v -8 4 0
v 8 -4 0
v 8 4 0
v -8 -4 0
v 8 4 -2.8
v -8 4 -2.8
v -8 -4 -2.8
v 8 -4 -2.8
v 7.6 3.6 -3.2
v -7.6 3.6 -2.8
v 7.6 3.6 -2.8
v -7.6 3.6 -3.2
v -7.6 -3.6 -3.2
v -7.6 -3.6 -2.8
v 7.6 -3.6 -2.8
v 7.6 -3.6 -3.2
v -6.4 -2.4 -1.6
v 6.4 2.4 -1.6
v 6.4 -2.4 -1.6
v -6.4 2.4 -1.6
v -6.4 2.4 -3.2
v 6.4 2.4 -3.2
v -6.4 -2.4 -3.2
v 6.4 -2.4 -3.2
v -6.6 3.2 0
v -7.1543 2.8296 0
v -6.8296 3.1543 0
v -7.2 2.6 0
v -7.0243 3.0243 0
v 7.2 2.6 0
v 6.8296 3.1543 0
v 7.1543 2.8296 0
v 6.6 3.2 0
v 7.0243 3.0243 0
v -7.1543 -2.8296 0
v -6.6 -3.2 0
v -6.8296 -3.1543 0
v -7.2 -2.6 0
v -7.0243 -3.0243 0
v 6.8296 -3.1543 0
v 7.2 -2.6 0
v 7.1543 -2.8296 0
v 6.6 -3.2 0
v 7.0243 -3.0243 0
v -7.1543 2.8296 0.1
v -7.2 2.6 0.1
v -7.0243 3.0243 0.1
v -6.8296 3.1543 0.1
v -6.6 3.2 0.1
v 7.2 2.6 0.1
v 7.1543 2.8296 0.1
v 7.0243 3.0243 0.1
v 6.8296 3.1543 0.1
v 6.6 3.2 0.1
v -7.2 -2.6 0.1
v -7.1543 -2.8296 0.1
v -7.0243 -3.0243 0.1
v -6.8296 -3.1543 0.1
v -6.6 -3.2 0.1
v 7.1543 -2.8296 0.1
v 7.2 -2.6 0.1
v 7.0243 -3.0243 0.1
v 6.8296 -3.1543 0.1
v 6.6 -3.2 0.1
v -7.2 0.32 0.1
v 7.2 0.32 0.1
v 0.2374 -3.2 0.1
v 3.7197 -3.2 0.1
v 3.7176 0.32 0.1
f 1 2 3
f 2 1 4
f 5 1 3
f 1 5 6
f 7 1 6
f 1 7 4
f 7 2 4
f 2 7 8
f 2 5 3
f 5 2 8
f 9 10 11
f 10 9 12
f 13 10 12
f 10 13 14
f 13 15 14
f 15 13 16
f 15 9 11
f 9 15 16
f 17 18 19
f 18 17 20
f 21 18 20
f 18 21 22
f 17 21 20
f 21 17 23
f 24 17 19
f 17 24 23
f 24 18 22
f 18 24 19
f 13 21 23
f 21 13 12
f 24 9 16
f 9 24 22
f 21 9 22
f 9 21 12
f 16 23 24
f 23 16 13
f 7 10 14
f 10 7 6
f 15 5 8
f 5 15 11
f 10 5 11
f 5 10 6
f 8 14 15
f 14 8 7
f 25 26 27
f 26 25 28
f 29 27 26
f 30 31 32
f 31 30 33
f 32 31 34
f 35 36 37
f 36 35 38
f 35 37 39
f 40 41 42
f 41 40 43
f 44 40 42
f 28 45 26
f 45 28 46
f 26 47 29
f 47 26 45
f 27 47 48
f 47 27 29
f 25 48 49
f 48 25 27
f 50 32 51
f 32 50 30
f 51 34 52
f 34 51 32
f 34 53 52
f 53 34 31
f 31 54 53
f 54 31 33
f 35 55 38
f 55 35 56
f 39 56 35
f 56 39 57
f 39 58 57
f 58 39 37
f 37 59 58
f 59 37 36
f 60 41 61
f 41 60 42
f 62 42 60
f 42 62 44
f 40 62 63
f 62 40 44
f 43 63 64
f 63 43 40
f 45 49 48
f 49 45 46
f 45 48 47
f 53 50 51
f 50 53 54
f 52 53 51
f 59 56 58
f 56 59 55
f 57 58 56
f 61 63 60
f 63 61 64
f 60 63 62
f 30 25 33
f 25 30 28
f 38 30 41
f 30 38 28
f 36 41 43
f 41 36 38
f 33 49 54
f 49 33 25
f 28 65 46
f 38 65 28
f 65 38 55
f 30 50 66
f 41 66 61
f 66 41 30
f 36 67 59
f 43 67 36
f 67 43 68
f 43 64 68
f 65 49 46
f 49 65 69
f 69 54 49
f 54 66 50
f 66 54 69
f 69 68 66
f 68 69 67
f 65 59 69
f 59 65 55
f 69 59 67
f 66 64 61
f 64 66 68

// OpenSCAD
// file: ../p/box5.scad
use <../lib.scad>
function ldraw_lib__box5() = [
// 0 Box with 5 Faces and All Edges
// 0 Name: box5.dat
// 0 Author: James Jessiman
// 0 !LDRAW_ORG Primitive UPDATE 2012-01
// 0 !LICENSE Licensed under CC BY 4.0 : see CAreadme.txt
// 
// 0 BFC CERTIFY CCW
  [0,"BFC","CERTIFY"],
  [0,"BFC","CCW"],
// 
// 0 !HISTORY 2002-04-03 [sbliss] Modified for BFC compliance
// 0 !HISTORY 2002-04-25 [PTadmin] Official Update 2002-02
// 0 !HISTORY 2007-06-24 [PTadmin] Header formatted for Contributor Agreement
// 0 !HISTORY 2008-07-01 [PTadmin] Official Update 2008-01
// 0 !HISTORY 2012-02-16 [Philo] Changed to CCW
// 0 !HISTORY 2012-03-30 [PTadmin] Official Update 2012-01
// 
// 
// 2 24 1 1 1 -1 1 1
  [2,24,1,1,1,-1,1,1],
// 2 24 -1 1 1 -1 1 -1
  [2,24,-1,1,1,-1,1,-1],
// 2 24 -1 1 -1 1 1 -1
  [2,24,-1,1,-1,1,1,-1],
// 2 24 1 1 -1 1 1 1
  [2,24,1,1,-1,1,1,1],
// 2 24 1 0 1 -1 0 1
  [2,24,1,0,1,-1,0,1],
// 2 24 -1 0 1 -1 0 -1
  [2,24,-1,0,1,-1,0,-1],
// 2 24 -1 0 -1 1 0 -1
  [2,24,-1,0,-1,1,0,-1],
// 2 24 1 0 -1 1 0 1
  [2,24,1,0,-1,1,0,1],
// 2 24 1 0 1 1 1 1
  [2,24,1,0,1,1,1,1],
// 2 24 -1 0 1 -1 1 1
  [2,24,-1,0,1,-1,1,1],
// 2 24 1 0 -1 1 1 -1
  [2,24,1,0,-1,1,1,-1],
// 2 24 -1 0 -1 -1 1 -1
  [2,24,-1,0,-1,-1,1,-1],
// 4 16 -1 1 1 1 1 1 1 1 -1 -1 1 -1
  [4,16,-1,1,1,1,1,1,1,1,-1,-1,1,-1],
// 4 16 -1 1 1 -1 0 1 1 0 1 1 1 1
  [4,16,-1,1,1,-1,0,1,1,0,1,1,1,1],
// 4 16 -1 1 -1 -1 0 -1 -1 0 1 -1 1 1
  [4,16,-1,1,-1,-1,0,-1,-1,0,1,-1,1,1],
// 4 16 1 1 -1 1 0 -1 -1 0 -1 -1 1 -1
  [4,16,1,1,-1,1,0,-1,-1,0,-1,-1,1,-1],
// 4 16 1 1 1 1 0 1 1 0 -1 1 1 -1
  [4,16,1,1,1,1,0,1,1,0,-1,1,1,-1],
];
module ldraw_lib__box5(step=0, col=false, unit=2/5, alt=false, line=0.2, solid=!$preview)
    makepoly(ldraw_lib__box5(), step=step, col=col, unit=unit, alt=alt, line=line, solid=solid);
ldraw_lib__box5(line=0.2);
// file: ../p/box4.scad
use <../lib.scad>
function ldraw_lib__box4() = [
// 0 Box with 4 Faces (2 Parallel Pairs) and All Edges
// 0 Name: box4.dat
// 0 Author: James Jessiman
// 0 !LDRAW_ORG Primitive UPDATE 2012-01
// 0 !LICENSE Licensed under CC BY 4.0 : see CAreadme.txt
// 
// 0 BFC CERTIFY CCW
  [0,"BFC","CERTIFY"],
  [0,"BFC","CCW"],
// 
// 0 !HISTORY 2002-04-03 [sbliss] Modified for BFC compliance
// 0 !HISTORY 2002-04-25 [PTadmin] Official Update 2002-02
// 0 !HISTORY 2007-06-24 [PTadmin] Header formatted for Contributor Agreement
// 0 !HISTORY 2008-07-01 [PTadmin] Official Update 2008-01
// 0 !HISTORY 2012-02-16 [Philo] Changed to CCW
// 0 !HISTORY 2012-03-30 [PTadmin] Official Update 2012-01
// 
// 
// 2 24 1 1 1 -1 1 1
  [2,24,1,1,1,-1,1,1],
// 2 24 -1 1 1 -1 1 -1
  [2,24,-1,1,1,-1,1,-1],
// 2 24 -1 1 -1 1 1 -1
  [2,24,-1,1,-1,1,1,-1],
// 2 24 1 1 -1 1 1 1
  [2,24,1,1,-1,1,1,1],
// 2 24 1 0 1 -1 0 1
  [2,24,1,0,1,-1,0,1],
// 2 24 -1 0 1 -1 0 -1
  [2,24,-1,0,1,-1,0,-1],
// 2 24 -1 0 -1 1 0 -1
  [2,24,-1,0,-1,1,0,-1],
// 2 24 1 0 -1 1 0 1
  [2,24,1,0,-1,1,0,1],
// 2 24 1 0 1 1 1 1
  [2,24,1,0,1,1,1,1],
// 2 24 -1 0 1 -1 1 1
  [2,24,-1,0,1,-1,1,1],
// 2 24 1 0 -1 1 1 -1
  [2,24,1,0,-1,1,1,-1],
// 2 24 -1 0 -1 -1 1 -1
  [2,24,-1,0,-1,-1,1,-1],
// 4 16 -1 1 1 -1 0 1 1 0 1 1 1 1
  [4,16,-1,1,1,-1,0,1,1,0,1,1,1,1],
// 4 16 -1 1 -1 -1 0 -1 -1 0 1 -1 1 1
  [4,16,-1,1,-1,-1,0,-1,-1,0,1,-1,1,1],
// 4 16 1 1 -1 1 0 -1 -1 0 -1 -1 1 -1
  [4,16,1,1,-1,1,0,-1,-1,0,-1,-1,1,-1],
// 4 16 1 1 1 1 0 1 1 0 -1 1 1 -1
  [4,16,1,1,1,1,0,1,1,0,-1,1,1,-1],
];
module ldraw_lib__box4(step=0, col=false, unit=2/5, alt=false, line=0.2, solid=!$preview)
    makepoly(ldraw_lib__box4(), step=step, col=col, unit=unit, alt=alt, line=line, solid=solid);
ldraw_lib__box4(line=0.2);
// file: ../p/1-4cyli.scad
use <../lib.scad>
function ldraw_lib__1_4cyli() = [
// 0 Cylinder 0.25
// 0 Name: 1-4cyli.dat
// 0 Author: James Jessiman
// 0 !LDRAW_ORG Primitive UPDATE 2012-01
// 0 !LICENSE Licensed under CC BY 4.0 : see CAreadme.txt
// 
// 0 BFC CERTIFY CCW
  [0,"BFC","CERTIFY"],
  [0,"BFC","CCW"],
// 
// 0 !HISTORY 2002-03-23 [sbliss] Added BFC statement.
// 0 !HISTORY 2002-04-25 [PTadmin] Official Update 2002-02
// 0 !HISTORY 2007-06-22 [PTadmin] Header formatted for Contributor Agreement
// 0 !HISTORY 2008-07-01 [PTadmin] Official Update 2008-01
// 0 !HISTORY 2012-02-16 [Philo] Changed to CCW
// 0 !HISTORY 2012-03-30 [PTadmin] Official Update 2012-01
// 
// 
// 4 16 1 1 0 0.9239 1 0.3827 0.9239 0 0.3827 1 0 0
  [4,16,1,1,0,0.9239,1,0.3827,0.9239,0,0.3827,1,0,0],
// 5 24 1 0 0 1 1 0 0.9239 0 0.3827 1 0 -1
  [5,24,1,0,0,1,1,0,0.9239,0,0.3827,1,0,-1],
// 4 16 0.9239 1 0.3827 0.7071 1 0.7071 0.7071 0 0.7071 0.9239 0 0.3827
  [4,16,0.9239,1,0.3827,0.7071,1,0.7071,0.7071,0,0.7071,0.9239,0,0.3827],
// 5 24 0.9239 0 0.3827 0.9239 1 0.3827 0.7071 0 0.7071 1 0 0
  [5,24,0.9239,0,0.3827,0.9239,1,0.3827,0.7071,0,0.7071,1,0,0],
// 4 16 0.7071 1 0.7071 0.3827 1 0.9239 0.3827 0 0.9239 0.7071 0 0.7071
  [4,16,0.7071,1,0.7071,0.3827,1,0.9239,0.3827,0,0.9239,0.7071,0,0.7071],
// 5 24 0.7071 0 0.7071 0.7071 1 0.7071 0.3827 0 0.9239 0.9239 0 0.3827
  [5,24,0.7071,0,0.7071,0.7071,1,0.7071,0.3827,0,0.9239,0.9239,0,0.3827],
// 4 16 0.3827 1 0.9239 0 1 1 0 0 1 0.3827 0 0.9239
  [4,16,0.3827,1,0.9239,0,1,1,0,0,1,0.3827,0,0.9239],
// 5 24 0.3827 0 0.9239 0.3827 1 0.9239 0 0 1 0.7071 0 0.7071
  [5,24,0.3827,0,0.9239,0.3827,1,0.9239,0,0,1,0.7071,0,0.7071],
// 5 24 0 0 1 0 1 1 0.3827 0 0.9239 -1 0 1
  [5,24,0,0,1,0,1,1,0.3827,0,0.9239,-1,0,1],
];
module ldraw_lib__1_4cyli(step=0, col=false, unit=2/5, alt=false, line=0.2, solid=!$preview)
    makepoly(ldraw_lib__1_4cyli(), step=step, col=col, unit=unit, alt=alt, line=line, solid=solid);
ldraw_lib__1_4cyli(line=0.2);
// file: ../p/1-4chrd.scad
use <../lib.scad>
function ldraw_lib__1_4chrd() = [
// 0 Chord 0.25
// 0 Name: 1-4chrd.dat
// 0 Author: Max Martin Richter [MMR1988]
// 0 !LDRAW_ORG Primitive UPDATE 2023-05
// 0 !LICENSE Licensed under CC BY 4.0 : see CAreadme.txt
// 
// 0 BFC CERTIFY CCW
  [0,"BFC","CERTIFY"],
  [0,"BFC","CCW"],
// 
// 0 !HISTORY 2004-04-22 [PTadmin] Official Update 2004-02
// 0 !HISTORY 2007-10-09 [PTadmin] Header formatted for Contributor Agreement
// 0 !HISTORY 2008-07-01 [PTadmin] Official Update 2008-01
// 0 !HISTORY 2012-08-02 [MMR1988] Re-creation with PrimGen2 and Rectifier
// 0 !HISTORY 2012-08-09 [PTadmin] Official Update 2012-02
// 0 !HISTORY 2023-10-27 [OrionP] Change author to MMR1988 from hafhead
// 0 !HISTORY 2023-10-31 [OrionP] Official Update 2023-05
// 
// 4 16 0.9239 0 0.3827 0.3827 0 0.9239 0 0 1 1 0 0
  [4,16,0.9239,0,0.3827,0.3827,0,0.9239,0,0,1,1,0,0],
// 3 16 0.7071 0 0.7071 0.3827 0 0.9239 0.9239 0 0.3827
  [3,16,0.7071,0,0.7071,0.3827,0,0.9239,0.9239,0,0.3827],
];
module ldraw_lib__1_4chrd(step=0, col=false, unit=2/5, alt=false, line=0.2, solid=!$preview)
    makepoly(ldraw_lib__1_4chrd(), step=step, col=col, unit=unit, alt=alt, line=line, solid=solid);
ldraw_lib__1_4chrd(line=0.2);
// file: s/3069bs01.scad
use <../../lib.scad>
use <../../p/box4.scad>
use <../../p/box5.scad>
function ldraw_lib__s__3069bs01() = [
// 0 ~Tile  1 x  2 with Groove without Top Face
// 0 Name: s\3069bs01.dat
// 0 Author: Santeri Piippo [arezey]
// 0 !LDRAW_ORG Subpart UPDATE 2010-02
// 0 !LICENSE Licensed under CC BY 4.0 : see CAreadme.txt
// 
// 0 BFC CERTIFY CCW
  [0,"BFC","CERTIFY"],
  [0,"BFC","CCW"],
// 
// 0 !HISTORY 2010-07-05 [PTadmin] Official Update 2010-02
// 
// 
// 1 16 0 0 0 20 0 0 0 7 0 0 0 10 box4.dat
  [1,16,0,0,0,20,0,0,0,7,0,0,0,10, ldraw_lib__box4()],
// 1 16 0 7 0 19 0 0 0 1 0 0 0 9 box4.dat
  [1,16,0,7,0,19,0,0,0,1,0,0,0,9, ldraw_lib__box4()],
// 0 BFC INVERTNEXT
  [0,"BFC","INVERTNEXT"],
// 1 16 0 8 0 16 0 0 0 -4 0 0 0 6 box5.dat
  [1,16,0,8,0,16,0,0,0,-4,0,0,0,6, ldraw_lib__box5()],
// 4 16 -19 8 9 -16 8 6 -16 8 -6 -19 8 -9
  [4,16,-19,8,9,-16,8,6,-16,8,-6,-19,8,-9],
// 4 16 19 8 -9 16 8 -6 16 8 6 19 8 9
  [4,16,19,8,-9,16,8,-6,16,8,6,19,8,9],
// 4 16 19 8 9 16 8 6 -16 8 6 -19 8 9
  [4,16,19,8,9,16,8,6,-16,8,6,-19,8,9],
// 4 16 -19 8 -9 -16 8 -6 16 8 -6 19 8 -9
  [4,16,-19,8,-9,-16,8,-6,16,8,-6,19,8,-9],
// 4 16 -20 7 10 -19 7 9 -19 7 -9 -20 7 -10
  [4,16,-20,7,10,-19,7,9,-19,7,-9,-20,7,-10],
// 4 16 20 7 -10 19 7 -9 19 7 9 20 7 10
  [4,16,20,7,-10,19,7,-9,19,7,9,20,7,10],
// 4 16 20 7 10 19 7 9 -19 7 9 -20 7 10
  [4,16,20,7,10,19,7,9,-19,7,9,-20,7,10],
// 4 16 -20 7 -10 -19 7 -9 19 7 -9 20 7 -10
  [4,16,-20,7,-10,-19,7,-9,19,7,-9,20,7,-10],
// 0 //
];
module ldraw_lib__s__3069bs01(step=0, col=false, unit=2/5, alt=false, line=0.2, solid=!$preview)
    makepoly(ldraw_lib__s__3069bs01(), step=step, col=col, unit=unit, alt=alt, line=line, solid=solid);
ldraw_lib__s__3069bs01(line=0.2);
// file: 6148328as.scad
use <../lib.scad>
use <../p/1-4chrd.scad>
use <../p/1-4cyli.scad>
function ldraw_lib__6148328as() = [
// 0 Sticker  0.8 x  1.8 with Dark Grey Lines on White Background
// 0 Name: 6148328as.dat
// 0 Author: Massimo Maso [Sirio]
// 0 !LDRAW_ORG Part UPDATE 2024-08
// 0 !LICENSE Licensed under CC BY 4.0 : see CAreadme.txt
// 
// 0 BFC CERTIFY CCW
  [0,"BFC","CERTIFY"],
  [0,"BFC","CCW"],
// 
// 0 !KEYWORDS 919, Bricklink 75876stk01, Brickowl 852010, Hybrid, Pit Lane
// 0 !KEYWORDS Porsche, Rebrickable 26357, set 75876, Speed Champions
// 
// 0 !HISTORY 2024-09-30 [OrionP] Official Update 2024-08
// 
// 
// 0 // Primitives
// 1 16 -16.5 0 6.5 -1.5 0 0 0 -1 0 0 0 1.5 1-4chrd.dat
  [1,16,-16.5,0,6.5,-1.5,0,0,0,-1,0,0,0,1.5, ldraw_lib__1_4chrd()],
// 1 16 16.5 0 6.5 1.5 0 0 0 -1 0 0 0 1.5 1-4chrd.dat
  [1,16,16.5,0,6.5,1.5,0,0,0,-1,0,0,0,1.5, ldraw_lib__1_4chrd()],
// 1 16 -16.5 0 -6.5 -1.5 0 0 0 -1 0 0 0 -1.5 1-4chrd.dat
  [1,16,-16.5,0,-6.5,-1.5,0,0,0,-1,0,0,0,-1.5, ldraw_lib__1_4chrd()],
// 1 16 16.5 0 -6.5 1.5 0 0 0 -1 0 0 0 -1.5 1-4chrd.dat
  [1,16,16.5,0,-6.5,1.5,0,0,0,-1,0,0,0,-1.5, ldraw_lib__1_4chrd()],
// 1 16 -16.5 0 6.5 -1.5 0 0 0 -.25 0 0 0 1.5 1-4cyli.dat
  [1,16,-16.5,0,6.5,-1.5,0,0,0,-.25,0,0,0,1.5, ldraw_lib__1_4cyli()],
// 1 16 16.5 0 6.5 1.5 0 0 0 -.25 0 0 0 1.5 1-4cyli.dat
  [1,16,16.5,0,6.5,1.5,0,0,0,-.25,0,0,0,1.5, ldraw_lib__1_4cyli()],
// 1 16 -16.5 0 -6.5 -1.5 0 0 0 -.25 0 0 0 -1.5 1-4cyli.dat
  [1,16,-16.5,0,-6.5,-1.5,0,0,0,-.25,0,0,0,-1.5, ldraw_lib__1_4cyli()],
// 1 16 16.5 0 -6.5 1.5 0 0 0 -.25 0 0 0 -1.5 1-4cyli.dat
  [1,16,16.5,0,-6.5,1.5,0,0,0,-.25,0,0,0,-1.5, ldraw_lib__1_4cyli()],
// 1 72 -16.5 -.25 6.5 -1.5 0 0 0 1 0 0 0 1.5 1-4chrd.dat
  [1,72,-16.5,-.25,6.5,-1.5,0,0,0,1,0,0,0,1.5, ldraw_lib__1_4chrd()],
// 1 72 16.5 -.25 6.5 1.5 0 0 0 1 0 0 0 1.5 1-4chrd.dat
  [1,72,16.5,-.25,6.5,1.5,0,0,0,1,0,0,0,1.5, ldraw_lib__1_4chrd()],
// 1 15 -16.5 -.25 -6.5 -1.5 0 0 0 1 0 0 0 -1.5 1-4chrd.dat
  [1,15,-16.5,-.25,-6.5,-1.5,0,0,0,1,0,0,0,-1.5, ldraw_lib__1_4chrd()],
// 1 15 16.5 -.25 -6.5 1.5 0 0 0 1 0 0 0 -1.5 1-4chrd.dat
  [1,15,16.5,-.25,-6.5,1.5,0,0,0,1,0,0,0,-1.5, ldraw_lib__1_4chrd()],
// 0 // Bottom faces
// 4 16 16.5 0 8 18 0 6.5 -18 0 6.5 -16.5 0 8
  [4,16,16.5,0,8,18,0,6.5,-18,0,6.5,-16.5,0,8],
// 4 16 18 0 6.5 18 0 -6.5 -18 0 -6.5 -18 0 6.5
  [4,16,18,0,6.5,18,0,-6.5,-18,0,-6.5,-18,0,6.5],
// 4 16 16.5 0 -8 -16.5 0 -8 -18 0 -6.5 18 0 -6.5
  [4,16,16.5,0,-8,-16.5,0,-8,-18,0,-6.5,18,0,-6.5],
// 0 // Lateral faces
// 4 16 -16.5 0 8 -16.5 -.25 8 16.5 -.25 8 16.5 0 8
  [4,16,-16.5,0,8,-16.5,-.25,8,16.5,-.25,8,16.5,0,8],
// 3 16 -18 0 6.5 -18 -.25 .8 -18 -.25 6.5
  [3,16,-18,0,6.5,-18,-.25,.8,-18,-.25,6.5],
// 4 16 -18 0 6.5 -18 0 -6.5 -18 -.25 -6.5 -18 -.25 .8
  [4,16,-18,0,6.5,-18,0,-6.5,-18,-.25,-6.5,-18,-.25,.8],
// 3 16 18 0 6.5 18 -.25 6.5 18 -.25 .8
  [3,16,18,0,6.5,18,-.25,6.5,18,-.25,.8],
// 4 16 18 0 6.5 18 -.25 .8 18 -.25 -6.5 18 0 -6.5
  [4,16,18,0,6.5,18,-.25,.8,18,-.25,-6.5,18,0,-6.5],
// 3 16 -16.5 0 -8 .5934 -.25 -8 -16.5 -.25 -8
  [3,16,-16.5,0,-8,.5934,-.25,-8,-16.5,-.25,-8],
// 4 16 -16.5 0 -8 16.5 0 -8 9.2993 -.25 -8 .5934 -.25 -8
  [4,16,-16.5,0,-8,16.5,0,-8,9.2993,-.25,-8,.5934,-.25,-8],
// 3 16 16.5 0 -8 16.5 -.25 -8 9.2993 -.25 -8
  [3,16,16.5,0,-8,16.5,-.25,-8,9.2993,-.25,-8],
// 0 // Top faces
// 0 // Dark grey faces
// 4 72 9.2941 -.25 .8 -16.5 -.25 8 -18 -.25 6.5 -18 -.25 .8
  [4,72,9.2941,-.25,.8,-16.5,-.25,8,-18,-.25,6.5,-18,-.25,.8],
// 3 72 9.2941 -.25 .8 16.5 -.25 8 -16.5 -.25 8
  [3,72,9.2941,-.25,.8,16.5,-.25,8,-16.5,-.25,8],
// 4 72 9.2941 -.25 .8 18 -.25 .8 18 -.25 6.5 16.5 -.25 8
  [4,72,9.2941,-.25,.8,18,-.25,.8,18,-.25,6.5,16.5,-.25,8],
// 4 72 9.2941 -.25 .8 .5934 -.25 -8 9.2993 -.25 -8 18 -.25 .8
  [4,72,9.2941,-.25,.8,.5934,-.25,-8,9.2993,-.25,-8,18,-.25,.8],
// 0 // White faces
// 4 15 9.2941 -.25 .8 -18 -.25 .8 -18 -.25 -6.5 -16.5 -.25 -8
  [4,15,9.2941,-.25,.8,-18,-.25,.8,-18,-.25,-6.5,-16.5,-.25,-8],
// 3 15 9.2941 -.25 .8 -16.5 -.25 -8 .5934 -.25 -8
  [3,15,9.2941,-.25,.8,-16.5,-.25,-8,.5934,-.25,-8],
// 4 15 18 -.25 .8 9.2993 -.25 -8 16.5 -.25 -8 18 -.25 -6.5
  [4,15,18,-.25,.8,9.2993,-.25,-8,16.5,-.25,-8,18,-.25,-6.5],
];
module ldraw_lib__6148328as(step=0, col=false, unit=2/5, alt=false, line=0.2, solid=!$preview)
    makepoly(ldraw_lib__6148328as(), step=step, col=col, unit=unit, alt=alt, line=line, solid=solid);
ldraw_lib__6148328as(line=0.2);
// file: 3069b.scad
use <../lib.scad>
use <s/3069bs01.scad>
function ldraw_lib__3069b() = [
// 0 Tile  1 x  2 with Groove
// 0 Name: 3069b.dat
// 0 Author: Santeri Piippo [arezey]
// 0 !LDRAW_ORG Part UPDATE 2010-02
// 0 !LICENSE Licensed under CC BY 4.0 : see CAreadme.txt
// 
// 0 BFC CERTIFY CCW
  [0,"BFC","CERTIFY"],
  [0,"BFC","CCW"],
// 
// 0 !KEYWORDS BrickLink 3069
// 
// 0 !HISTORY 2010-07-05 [PTadmin] Official Update 2010-02
// 
// 
// 4 16 20 0 -10 20 0 10 -20 0 10 -20 0 -10
  [4,16,20,0,-10,20,0,10,-20,0,10,-20,0,-10],
// 1 16 0 0 0 1 0 0 0 1 0 0 0 1 s\3069bs01.dat
  [1,16,0,0,0,1,0,0,0,1,0,0,0,1, ldraw_lib__s__3069bs01()],
// 0 //
];
module ldraw_lib__3069b(step=0, col=false, unit=2/5, alt=false, line=0.2, solid=!$preview)
    makepoly(ldraw_lib__3069b(), step=step, col=col, unit=unit, alt=alt, line=line, solid=solid);
ldraw_lib__3069b(line=0.2);
// main file
use <../lib.scad>
use <3069b.scad>
use <6148328as.scad>
function ldraw_lib__3069bd2d() = [
// 0 Tile  1 x  2 with Dark Grey Lines on White Background Sticker
// 0 Name: 3069bd2d.dat
// 0 Author: Vincent Messenet [Cheenzo]
// 0 !LDRAW_ORG Shortcut UPDATE 2026-05
// 0 !LICENSE Licensed under CC BY 4.0 : see CAreadme.txt
// 
// 0 BFC CERTIFY CCW
  [0,"BFC","CERTIFY"],
  [0,"BFC","CCW"],
// 
// 0 !CATEGORY Sticker Shortcut
// 
// 0 !KEYWORDS Bricklink 3069pb0681, Porsche 919 Hybrid and 917K Pit Lane
// 0 !KEYWORDS set 75876, Speed Champions
// 
// 0 !HISTORY 2026-05-31 [OrionP] Official Update 2026-05
// 
// 1 16 0 0 0 1 0 0 0 1 0 0 0 1 3069b.dat
  [1,16,0,0,0,1,0,0,0,1,0,0,0,1, ldraw_lib__3069b()],
// 1 16 0 0 0 1 0 0 0 1 0 0 0 1 6148328as.dat
  [1,16,0,0,0,1,0,0,0,1,0,0,0,1, ldraw_lib__6148328as()],
];
module ldraw_lib__3069bd2d(step=0, col=false, unit=2/5, alt=false, line=0.2, solid=!$preview)
    makepoly(ldraw_lib__3069bd2d(), step=step, col=col, unit=unit, alt=alt, line=line, solid=solid);
ldraw_lib__3069bd2d(line=0.2);
